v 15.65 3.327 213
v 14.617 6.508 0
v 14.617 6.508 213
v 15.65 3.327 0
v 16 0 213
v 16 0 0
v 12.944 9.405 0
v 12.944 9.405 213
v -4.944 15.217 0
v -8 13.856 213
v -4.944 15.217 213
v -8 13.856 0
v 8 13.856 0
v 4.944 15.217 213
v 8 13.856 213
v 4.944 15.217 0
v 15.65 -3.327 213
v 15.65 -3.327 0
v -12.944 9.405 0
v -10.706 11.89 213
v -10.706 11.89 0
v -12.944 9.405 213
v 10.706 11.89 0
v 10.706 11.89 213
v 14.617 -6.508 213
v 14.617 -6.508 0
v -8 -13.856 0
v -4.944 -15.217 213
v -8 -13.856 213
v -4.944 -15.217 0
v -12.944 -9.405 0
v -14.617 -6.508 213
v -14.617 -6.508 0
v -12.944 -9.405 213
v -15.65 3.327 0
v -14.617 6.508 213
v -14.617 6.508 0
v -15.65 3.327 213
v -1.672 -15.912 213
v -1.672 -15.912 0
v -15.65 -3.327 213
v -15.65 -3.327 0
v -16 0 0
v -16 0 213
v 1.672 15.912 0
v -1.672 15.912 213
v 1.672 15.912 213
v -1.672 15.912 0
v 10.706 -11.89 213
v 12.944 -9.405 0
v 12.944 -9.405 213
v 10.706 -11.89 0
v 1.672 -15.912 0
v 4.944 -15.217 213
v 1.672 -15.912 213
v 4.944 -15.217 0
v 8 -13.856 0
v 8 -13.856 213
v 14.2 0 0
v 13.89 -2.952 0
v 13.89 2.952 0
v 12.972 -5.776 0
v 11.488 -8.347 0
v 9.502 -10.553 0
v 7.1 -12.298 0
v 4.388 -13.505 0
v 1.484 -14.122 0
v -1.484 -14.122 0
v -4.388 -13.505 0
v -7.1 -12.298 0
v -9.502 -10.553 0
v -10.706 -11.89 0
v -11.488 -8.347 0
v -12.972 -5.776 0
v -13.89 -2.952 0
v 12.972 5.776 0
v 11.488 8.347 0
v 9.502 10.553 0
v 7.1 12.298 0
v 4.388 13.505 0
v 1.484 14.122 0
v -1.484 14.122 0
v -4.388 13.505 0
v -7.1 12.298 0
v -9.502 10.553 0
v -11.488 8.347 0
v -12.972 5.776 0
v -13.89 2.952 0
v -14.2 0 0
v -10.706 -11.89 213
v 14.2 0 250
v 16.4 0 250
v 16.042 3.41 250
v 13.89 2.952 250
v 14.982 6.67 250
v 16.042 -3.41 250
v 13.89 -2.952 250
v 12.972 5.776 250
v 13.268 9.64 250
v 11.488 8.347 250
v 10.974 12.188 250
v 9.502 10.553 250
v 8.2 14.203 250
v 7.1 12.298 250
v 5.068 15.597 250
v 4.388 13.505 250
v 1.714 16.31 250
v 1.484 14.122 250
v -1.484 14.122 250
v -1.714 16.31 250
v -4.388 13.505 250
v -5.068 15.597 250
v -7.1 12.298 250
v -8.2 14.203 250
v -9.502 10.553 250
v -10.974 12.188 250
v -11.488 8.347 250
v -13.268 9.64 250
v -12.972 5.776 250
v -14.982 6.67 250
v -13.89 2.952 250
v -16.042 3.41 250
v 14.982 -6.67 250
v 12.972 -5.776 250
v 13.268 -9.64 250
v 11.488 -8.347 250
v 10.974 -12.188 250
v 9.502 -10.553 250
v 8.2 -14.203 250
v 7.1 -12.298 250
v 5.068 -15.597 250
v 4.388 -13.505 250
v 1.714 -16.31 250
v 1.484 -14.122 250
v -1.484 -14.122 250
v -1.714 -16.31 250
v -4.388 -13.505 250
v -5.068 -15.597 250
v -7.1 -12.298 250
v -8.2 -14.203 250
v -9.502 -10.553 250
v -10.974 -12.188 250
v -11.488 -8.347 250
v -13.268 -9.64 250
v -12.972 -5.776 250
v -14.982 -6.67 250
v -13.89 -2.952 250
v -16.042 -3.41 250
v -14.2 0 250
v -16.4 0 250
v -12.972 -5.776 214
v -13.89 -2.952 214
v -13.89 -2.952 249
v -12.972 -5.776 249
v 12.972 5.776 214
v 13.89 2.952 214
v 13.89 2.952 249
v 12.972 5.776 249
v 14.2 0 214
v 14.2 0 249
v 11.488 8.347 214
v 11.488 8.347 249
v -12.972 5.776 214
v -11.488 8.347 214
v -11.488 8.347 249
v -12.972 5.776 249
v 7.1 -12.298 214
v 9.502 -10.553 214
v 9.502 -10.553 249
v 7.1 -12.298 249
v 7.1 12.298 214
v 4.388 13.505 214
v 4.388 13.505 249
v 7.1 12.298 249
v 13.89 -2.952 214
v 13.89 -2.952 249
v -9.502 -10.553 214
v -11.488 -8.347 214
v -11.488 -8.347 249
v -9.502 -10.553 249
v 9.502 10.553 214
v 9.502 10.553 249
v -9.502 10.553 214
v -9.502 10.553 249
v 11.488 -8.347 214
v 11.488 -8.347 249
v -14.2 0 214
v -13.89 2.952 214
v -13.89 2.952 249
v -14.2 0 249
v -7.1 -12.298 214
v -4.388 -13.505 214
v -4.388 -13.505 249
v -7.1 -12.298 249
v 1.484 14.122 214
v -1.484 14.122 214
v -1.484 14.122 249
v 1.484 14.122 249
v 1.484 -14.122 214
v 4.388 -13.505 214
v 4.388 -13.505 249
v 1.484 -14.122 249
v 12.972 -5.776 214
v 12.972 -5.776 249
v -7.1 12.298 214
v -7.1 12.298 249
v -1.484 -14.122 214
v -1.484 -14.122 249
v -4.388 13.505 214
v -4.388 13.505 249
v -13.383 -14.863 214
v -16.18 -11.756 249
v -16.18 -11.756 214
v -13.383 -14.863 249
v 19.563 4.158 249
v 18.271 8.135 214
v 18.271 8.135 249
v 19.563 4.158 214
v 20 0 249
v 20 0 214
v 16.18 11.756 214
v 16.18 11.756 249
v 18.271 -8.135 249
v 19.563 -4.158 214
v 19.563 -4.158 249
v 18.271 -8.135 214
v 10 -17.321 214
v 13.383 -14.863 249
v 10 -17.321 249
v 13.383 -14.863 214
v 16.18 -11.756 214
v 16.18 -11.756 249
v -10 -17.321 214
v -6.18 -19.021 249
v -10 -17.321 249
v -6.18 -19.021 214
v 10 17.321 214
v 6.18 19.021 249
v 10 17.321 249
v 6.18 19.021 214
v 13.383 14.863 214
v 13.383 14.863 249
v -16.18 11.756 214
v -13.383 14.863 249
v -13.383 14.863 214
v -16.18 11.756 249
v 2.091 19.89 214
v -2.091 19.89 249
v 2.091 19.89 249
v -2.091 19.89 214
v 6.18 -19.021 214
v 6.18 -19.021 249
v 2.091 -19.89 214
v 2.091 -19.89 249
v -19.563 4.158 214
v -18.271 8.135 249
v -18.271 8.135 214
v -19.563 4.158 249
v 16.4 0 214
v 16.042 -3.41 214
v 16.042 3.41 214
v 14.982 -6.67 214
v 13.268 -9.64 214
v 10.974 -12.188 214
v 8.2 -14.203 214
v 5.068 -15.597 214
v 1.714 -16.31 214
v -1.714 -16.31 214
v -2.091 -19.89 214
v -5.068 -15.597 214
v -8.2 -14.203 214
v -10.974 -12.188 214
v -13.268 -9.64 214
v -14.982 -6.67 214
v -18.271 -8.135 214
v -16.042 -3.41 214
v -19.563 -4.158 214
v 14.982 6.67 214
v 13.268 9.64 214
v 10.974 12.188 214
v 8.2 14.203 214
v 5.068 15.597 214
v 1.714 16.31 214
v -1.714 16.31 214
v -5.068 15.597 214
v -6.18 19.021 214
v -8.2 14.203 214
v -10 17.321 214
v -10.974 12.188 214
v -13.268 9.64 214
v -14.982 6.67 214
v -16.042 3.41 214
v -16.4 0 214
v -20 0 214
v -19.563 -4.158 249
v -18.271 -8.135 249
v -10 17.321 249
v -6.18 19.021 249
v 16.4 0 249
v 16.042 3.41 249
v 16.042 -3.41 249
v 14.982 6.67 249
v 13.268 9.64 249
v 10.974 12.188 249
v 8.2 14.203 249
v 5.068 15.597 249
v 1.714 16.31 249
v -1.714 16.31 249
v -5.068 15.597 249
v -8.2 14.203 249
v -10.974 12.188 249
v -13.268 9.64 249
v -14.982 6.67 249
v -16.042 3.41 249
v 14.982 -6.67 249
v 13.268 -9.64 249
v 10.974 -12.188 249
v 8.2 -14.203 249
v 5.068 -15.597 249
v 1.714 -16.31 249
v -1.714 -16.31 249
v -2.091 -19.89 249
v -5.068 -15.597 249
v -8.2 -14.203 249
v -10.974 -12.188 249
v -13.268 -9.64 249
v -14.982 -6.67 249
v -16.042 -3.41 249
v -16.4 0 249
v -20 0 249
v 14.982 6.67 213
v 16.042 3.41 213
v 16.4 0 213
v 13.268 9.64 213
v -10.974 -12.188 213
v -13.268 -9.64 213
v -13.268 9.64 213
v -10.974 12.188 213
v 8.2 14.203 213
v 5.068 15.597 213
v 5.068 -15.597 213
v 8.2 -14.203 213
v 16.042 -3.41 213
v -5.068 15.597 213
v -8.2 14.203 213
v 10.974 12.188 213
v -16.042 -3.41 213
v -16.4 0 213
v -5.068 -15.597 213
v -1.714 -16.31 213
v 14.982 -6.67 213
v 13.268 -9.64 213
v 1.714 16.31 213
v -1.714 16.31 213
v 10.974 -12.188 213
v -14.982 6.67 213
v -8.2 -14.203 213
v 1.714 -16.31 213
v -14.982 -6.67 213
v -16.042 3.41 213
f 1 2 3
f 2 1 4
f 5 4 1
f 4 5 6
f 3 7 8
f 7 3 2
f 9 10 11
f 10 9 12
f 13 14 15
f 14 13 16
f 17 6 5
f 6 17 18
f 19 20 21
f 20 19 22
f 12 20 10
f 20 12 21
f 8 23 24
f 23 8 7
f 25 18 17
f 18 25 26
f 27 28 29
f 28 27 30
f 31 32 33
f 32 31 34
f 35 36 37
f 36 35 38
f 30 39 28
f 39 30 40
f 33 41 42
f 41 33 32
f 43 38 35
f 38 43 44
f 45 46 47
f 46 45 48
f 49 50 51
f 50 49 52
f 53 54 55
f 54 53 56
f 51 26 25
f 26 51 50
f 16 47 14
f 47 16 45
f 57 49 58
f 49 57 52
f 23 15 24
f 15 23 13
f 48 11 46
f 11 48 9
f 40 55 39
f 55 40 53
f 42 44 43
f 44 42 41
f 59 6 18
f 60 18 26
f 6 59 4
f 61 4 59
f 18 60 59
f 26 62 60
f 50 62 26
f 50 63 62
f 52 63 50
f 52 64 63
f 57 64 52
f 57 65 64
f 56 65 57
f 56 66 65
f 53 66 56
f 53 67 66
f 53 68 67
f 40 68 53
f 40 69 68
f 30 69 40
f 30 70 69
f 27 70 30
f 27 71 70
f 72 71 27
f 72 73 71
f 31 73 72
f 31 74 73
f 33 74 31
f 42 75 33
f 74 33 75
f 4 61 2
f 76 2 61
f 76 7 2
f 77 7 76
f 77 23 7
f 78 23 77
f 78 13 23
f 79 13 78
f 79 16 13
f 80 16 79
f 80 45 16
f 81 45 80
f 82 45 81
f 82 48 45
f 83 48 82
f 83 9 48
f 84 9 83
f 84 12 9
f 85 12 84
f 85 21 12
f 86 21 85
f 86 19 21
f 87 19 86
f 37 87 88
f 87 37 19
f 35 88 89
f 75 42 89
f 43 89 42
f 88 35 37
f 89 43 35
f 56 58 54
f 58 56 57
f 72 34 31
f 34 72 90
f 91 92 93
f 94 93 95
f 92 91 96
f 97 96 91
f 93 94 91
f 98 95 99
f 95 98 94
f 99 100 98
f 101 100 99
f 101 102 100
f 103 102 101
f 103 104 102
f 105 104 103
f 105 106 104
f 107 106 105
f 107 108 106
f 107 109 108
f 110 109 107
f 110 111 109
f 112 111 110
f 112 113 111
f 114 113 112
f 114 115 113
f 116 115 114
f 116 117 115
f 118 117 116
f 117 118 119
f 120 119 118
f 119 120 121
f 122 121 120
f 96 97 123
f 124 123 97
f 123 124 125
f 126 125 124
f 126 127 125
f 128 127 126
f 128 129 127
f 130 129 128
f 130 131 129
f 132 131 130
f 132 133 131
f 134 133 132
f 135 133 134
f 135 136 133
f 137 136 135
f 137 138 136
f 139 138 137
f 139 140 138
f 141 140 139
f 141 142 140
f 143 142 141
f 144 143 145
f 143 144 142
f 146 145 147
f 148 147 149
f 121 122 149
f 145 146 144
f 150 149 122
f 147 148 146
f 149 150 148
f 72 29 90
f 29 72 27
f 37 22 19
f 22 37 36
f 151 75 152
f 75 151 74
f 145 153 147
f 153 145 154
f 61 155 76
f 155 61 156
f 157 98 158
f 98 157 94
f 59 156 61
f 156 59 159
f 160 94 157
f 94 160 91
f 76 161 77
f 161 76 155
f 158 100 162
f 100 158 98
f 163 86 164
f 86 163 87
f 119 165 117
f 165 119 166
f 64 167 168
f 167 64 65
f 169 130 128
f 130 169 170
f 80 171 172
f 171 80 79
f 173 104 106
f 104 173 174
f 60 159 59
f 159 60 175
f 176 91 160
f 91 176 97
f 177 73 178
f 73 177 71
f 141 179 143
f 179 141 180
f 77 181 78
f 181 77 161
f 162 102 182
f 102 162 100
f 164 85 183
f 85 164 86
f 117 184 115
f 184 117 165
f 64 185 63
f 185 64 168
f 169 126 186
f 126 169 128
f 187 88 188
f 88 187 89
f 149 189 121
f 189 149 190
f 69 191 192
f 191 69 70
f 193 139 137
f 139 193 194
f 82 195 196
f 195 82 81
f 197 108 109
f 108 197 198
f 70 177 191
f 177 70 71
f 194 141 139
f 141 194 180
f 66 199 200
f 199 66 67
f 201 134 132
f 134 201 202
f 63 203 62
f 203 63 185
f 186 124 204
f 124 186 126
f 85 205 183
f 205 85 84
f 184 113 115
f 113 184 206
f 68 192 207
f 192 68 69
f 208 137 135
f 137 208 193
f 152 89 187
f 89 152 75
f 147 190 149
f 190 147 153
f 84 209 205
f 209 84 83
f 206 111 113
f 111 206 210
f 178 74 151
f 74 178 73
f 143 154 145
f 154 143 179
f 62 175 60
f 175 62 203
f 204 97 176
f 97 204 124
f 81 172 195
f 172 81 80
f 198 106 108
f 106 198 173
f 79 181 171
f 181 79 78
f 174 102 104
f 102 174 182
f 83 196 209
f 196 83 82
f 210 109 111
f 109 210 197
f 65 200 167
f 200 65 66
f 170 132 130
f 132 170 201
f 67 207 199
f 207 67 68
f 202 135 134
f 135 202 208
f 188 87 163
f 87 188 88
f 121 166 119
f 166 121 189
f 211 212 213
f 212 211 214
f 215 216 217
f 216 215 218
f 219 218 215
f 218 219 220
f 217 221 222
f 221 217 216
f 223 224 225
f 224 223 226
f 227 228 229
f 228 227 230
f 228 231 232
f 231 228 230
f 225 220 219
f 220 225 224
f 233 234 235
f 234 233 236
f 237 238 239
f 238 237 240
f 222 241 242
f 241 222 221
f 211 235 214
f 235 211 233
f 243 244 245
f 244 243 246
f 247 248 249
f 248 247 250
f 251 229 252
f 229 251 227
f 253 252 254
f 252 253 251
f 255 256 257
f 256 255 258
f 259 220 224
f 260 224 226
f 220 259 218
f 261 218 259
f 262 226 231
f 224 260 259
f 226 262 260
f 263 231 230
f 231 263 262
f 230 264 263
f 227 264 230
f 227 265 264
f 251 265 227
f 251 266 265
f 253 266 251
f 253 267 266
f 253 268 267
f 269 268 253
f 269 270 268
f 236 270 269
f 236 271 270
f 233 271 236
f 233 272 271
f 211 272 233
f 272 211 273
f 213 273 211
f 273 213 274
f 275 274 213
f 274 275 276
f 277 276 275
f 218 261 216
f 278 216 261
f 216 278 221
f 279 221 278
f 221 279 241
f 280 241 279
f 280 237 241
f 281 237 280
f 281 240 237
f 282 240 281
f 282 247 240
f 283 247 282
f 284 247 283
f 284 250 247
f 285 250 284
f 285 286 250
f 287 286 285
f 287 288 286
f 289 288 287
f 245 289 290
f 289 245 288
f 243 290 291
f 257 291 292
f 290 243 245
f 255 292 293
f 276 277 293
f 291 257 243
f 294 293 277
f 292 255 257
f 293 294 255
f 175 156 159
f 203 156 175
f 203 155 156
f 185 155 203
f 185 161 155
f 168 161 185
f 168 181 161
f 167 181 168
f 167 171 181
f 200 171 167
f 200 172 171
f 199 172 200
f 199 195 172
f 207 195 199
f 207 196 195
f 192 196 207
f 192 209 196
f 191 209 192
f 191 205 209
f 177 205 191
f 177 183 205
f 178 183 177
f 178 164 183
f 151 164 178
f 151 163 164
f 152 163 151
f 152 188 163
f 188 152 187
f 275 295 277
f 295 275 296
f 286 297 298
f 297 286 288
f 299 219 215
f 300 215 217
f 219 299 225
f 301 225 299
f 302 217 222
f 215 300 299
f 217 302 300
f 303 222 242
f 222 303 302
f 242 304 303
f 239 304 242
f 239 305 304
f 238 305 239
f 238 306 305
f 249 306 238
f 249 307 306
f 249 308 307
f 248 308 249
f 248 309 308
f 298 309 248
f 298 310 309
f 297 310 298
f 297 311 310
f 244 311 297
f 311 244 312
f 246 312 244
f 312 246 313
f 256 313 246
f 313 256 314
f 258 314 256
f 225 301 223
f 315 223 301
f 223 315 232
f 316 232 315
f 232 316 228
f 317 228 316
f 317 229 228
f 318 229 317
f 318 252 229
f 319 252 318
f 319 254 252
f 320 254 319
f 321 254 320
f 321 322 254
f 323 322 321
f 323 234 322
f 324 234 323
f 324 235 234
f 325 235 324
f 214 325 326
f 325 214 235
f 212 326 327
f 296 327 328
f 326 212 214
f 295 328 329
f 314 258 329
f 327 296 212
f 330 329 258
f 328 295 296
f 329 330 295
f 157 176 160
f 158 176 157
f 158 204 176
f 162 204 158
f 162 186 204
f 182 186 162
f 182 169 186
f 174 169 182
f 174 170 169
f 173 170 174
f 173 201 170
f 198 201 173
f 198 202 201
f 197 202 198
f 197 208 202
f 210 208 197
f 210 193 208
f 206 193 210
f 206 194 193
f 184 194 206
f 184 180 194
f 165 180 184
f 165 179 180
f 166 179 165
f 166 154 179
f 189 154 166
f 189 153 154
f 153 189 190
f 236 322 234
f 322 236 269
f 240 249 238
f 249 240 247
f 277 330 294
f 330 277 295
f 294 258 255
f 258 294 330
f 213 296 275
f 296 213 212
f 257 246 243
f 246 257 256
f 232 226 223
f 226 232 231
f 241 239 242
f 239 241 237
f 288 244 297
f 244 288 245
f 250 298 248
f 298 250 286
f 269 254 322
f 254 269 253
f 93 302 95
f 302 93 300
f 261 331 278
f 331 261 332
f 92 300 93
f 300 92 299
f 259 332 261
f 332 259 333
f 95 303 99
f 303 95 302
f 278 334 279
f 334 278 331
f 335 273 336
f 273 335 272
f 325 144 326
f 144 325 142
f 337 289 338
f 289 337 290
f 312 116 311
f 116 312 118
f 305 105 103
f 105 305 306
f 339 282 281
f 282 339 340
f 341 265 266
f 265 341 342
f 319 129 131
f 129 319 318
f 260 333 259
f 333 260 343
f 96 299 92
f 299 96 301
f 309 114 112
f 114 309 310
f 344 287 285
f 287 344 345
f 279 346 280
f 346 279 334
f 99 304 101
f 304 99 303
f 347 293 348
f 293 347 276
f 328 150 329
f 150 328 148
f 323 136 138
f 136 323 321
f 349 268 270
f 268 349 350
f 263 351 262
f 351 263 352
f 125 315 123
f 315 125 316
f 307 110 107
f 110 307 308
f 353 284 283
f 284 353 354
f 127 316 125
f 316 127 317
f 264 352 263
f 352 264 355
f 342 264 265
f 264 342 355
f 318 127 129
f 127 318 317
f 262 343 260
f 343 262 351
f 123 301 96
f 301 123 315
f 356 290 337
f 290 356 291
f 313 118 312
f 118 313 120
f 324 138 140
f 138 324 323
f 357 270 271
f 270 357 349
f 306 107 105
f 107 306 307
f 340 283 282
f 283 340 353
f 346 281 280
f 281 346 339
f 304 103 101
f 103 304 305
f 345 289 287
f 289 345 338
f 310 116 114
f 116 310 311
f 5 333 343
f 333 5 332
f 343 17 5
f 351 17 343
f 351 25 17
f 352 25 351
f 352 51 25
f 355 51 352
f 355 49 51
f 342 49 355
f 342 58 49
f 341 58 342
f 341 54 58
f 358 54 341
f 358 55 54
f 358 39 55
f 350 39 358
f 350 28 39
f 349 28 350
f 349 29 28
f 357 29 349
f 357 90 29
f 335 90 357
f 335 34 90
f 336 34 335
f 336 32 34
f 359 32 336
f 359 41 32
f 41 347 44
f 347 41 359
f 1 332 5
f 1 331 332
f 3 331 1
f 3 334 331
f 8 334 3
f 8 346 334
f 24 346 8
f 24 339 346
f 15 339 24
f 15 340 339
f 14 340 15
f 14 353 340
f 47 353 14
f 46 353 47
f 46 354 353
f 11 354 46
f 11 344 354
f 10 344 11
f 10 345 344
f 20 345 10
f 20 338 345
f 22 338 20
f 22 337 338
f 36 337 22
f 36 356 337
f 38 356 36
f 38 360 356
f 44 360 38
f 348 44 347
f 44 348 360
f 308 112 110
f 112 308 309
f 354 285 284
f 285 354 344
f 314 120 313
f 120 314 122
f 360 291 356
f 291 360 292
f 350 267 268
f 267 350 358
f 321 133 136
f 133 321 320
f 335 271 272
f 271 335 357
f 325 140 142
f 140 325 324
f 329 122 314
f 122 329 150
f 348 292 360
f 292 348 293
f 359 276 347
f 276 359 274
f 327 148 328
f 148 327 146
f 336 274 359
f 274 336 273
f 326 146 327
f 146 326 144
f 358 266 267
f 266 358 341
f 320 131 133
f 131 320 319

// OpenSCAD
// Parameters
length_mm = 250; //[125:500:1]
include_end_fitting = 1; //[0:1:1]
ht32_outer_diameter = 32; //[16:64:0.5]
ht32_wall_thickness = 1.8; //[0.9:3.6:0.1]
fitting_outer_diameter = 40; //[30:60:0.5]
fitting_length = 35; //[18:70:1]
fitting_wall_extra = 2.2; //[1:5:0.1]
socket_clearance = 0.4; //[0.1:1.2:0.05]
socket_stop_thickness = 2; //[1:5:0.1]
socket_stop_position = 22; //[10:50:1]
socket_stop_width = 3; //[1:8:0.5]
overlap_mm = 1; //[0.5:2:0.1]

// HT Pipe - complete geometry
module ht_pipe() {
  color([0.85, 0.85, 0.8]) {
    // Pipe segment
    difference() {
      cylinder(h=length_mm, r=ht32_outer_diameter/2, center=false);
      translate([0, 0, -overlap_mm])
        cylinder(h=length_mm + 2*overlap_mm, r=ht32_outer_diameter/2 - ht32_wall_thickness, center=false);
    }
    
    // End fitting
    if (include_end_fitting) {
      union() {
        // Outer fitting
        translate([0, 0, length_mm - fitting_length - overlap_mm])
          cylinder(h=fitting_length, r=fitting_outer_diameter/2, center=false);
        
        // Socket stop ring
        translate([0, 0, length_mm - fitting_length - overlap_mm + socket_stop_position - socket_stop_width/2])
          difference() {
            cylinder(h=socket_stop_width, r=ht32_outer_diameter/2 + socket_clearance + socket_stop_thickness, center=false);
            translate([0, 0, -overlap_mm])
              cylinder(h=socket_stop_width + 2*overlap_mm, r=ht32_outer_diameter/2 + socket_clearance, center=false);
          }
      }
      
      // Socket voids
      difference() {
        translate([0, 0, length_mm - fitting_length - overlap_mm - overlap_mm])
          cylinder(h=fitting_length + 2*overlap_mm, r=ht32_outer_diameter/2 + socket_clearance, center=false);
        translate([0, 0, length_mm - fitting_length - overlap_mm - overlap_mm])
          cylinder(h=fitting_length + 2*overlap_mm, r=ht32_outer_diameter/2 - ht32_wall_thickness, center=false);
      }
    }
  }
}

// Assembly
module assembly() {
  ht_pipe();
}

assembly();
